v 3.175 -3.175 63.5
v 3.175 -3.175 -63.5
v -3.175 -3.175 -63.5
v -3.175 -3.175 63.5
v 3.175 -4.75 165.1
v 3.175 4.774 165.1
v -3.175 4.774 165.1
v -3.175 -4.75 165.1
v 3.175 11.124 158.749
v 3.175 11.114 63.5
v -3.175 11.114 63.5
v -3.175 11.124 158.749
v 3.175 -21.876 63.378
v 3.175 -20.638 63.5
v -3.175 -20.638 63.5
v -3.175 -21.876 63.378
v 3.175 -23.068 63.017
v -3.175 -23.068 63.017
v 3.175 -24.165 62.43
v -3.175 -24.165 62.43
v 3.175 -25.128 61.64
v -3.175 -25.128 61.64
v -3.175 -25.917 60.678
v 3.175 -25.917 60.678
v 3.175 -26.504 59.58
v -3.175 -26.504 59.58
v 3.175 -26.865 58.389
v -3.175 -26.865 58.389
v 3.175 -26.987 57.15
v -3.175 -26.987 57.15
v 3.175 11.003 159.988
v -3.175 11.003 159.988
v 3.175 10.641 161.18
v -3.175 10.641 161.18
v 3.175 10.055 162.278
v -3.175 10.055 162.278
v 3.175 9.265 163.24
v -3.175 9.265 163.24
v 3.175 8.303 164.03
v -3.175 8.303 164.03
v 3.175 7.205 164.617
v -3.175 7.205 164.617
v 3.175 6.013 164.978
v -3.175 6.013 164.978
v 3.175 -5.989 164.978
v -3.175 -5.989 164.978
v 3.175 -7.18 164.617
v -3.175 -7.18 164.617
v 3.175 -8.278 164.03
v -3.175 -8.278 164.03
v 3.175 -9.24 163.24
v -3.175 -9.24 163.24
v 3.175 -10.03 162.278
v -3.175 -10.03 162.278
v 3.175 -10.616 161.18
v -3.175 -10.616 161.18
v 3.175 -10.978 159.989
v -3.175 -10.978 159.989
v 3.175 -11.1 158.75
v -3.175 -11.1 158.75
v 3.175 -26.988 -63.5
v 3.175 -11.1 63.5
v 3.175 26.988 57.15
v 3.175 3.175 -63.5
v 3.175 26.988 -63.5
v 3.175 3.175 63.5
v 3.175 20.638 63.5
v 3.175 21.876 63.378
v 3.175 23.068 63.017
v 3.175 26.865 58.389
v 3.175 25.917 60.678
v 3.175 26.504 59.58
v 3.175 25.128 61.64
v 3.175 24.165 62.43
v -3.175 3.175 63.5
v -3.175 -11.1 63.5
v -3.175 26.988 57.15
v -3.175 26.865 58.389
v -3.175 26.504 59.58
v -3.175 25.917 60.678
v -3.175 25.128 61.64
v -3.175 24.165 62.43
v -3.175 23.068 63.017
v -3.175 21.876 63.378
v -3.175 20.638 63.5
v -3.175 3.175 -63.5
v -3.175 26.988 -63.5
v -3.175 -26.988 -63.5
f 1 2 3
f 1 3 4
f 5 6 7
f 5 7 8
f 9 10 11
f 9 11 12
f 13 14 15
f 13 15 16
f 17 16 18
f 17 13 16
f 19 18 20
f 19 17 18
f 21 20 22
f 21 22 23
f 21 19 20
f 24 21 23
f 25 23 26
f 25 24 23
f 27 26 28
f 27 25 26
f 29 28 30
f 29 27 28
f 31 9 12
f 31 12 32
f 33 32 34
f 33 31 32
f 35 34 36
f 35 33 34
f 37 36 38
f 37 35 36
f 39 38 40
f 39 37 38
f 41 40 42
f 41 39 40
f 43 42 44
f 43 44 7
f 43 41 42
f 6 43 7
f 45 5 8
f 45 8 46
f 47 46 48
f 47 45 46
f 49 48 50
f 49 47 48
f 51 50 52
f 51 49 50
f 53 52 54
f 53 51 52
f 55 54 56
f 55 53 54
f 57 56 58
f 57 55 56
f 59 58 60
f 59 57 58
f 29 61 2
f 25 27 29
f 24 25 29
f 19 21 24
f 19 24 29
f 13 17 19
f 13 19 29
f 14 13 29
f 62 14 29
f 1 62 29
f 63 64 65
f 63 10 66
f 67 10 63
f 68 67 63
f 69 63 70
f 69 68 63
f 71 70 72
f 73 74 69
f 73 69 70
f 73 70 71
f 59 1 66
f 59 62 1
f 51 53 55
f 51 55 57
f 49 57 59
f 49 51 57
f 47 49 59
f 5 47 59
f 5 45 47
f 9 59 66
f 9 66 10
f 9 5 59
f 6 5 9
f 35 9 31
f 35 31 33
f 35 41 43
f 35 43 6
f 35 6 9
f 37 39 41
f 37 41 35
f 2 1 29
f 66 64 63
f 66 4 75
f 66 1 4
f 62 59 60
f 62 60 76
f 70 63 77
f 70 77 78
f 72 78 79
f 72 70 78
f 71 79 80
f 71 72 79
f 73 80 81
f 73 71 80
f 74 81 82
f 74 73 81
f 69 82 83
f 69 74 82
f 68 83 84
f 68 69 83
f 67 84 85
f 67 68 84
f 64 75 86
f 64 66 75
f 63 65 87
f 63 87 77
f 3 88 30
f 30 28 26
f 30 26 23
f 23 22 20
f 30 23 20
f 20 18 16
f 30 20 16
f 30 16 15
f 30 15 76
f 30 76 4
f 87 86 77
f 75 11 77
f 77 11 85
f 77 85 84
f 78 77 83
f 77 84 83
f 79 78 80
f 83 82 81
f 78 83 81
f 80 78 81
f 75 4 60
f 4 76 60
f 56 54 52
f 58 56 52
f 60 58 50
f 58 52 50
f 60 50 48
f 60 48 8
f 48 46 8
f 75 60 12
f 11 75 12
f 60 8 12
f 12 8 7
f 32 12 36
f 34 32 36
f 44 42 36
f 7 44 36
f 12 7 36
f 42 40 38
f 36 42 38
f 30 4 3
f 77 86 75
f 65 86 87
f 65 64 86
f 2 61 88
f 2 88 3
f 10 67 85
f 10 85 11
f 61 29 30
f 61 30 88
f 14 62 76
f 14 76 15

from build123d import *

# Parameters (mm, degrees)
F1_DEPTH = 3.175


with BuildPart() as f1:
    # F0 (on Right) → F1 (new body, symmetric)
    with BuildSketch(Plane.YZ):
        with BuildLine():
            Line((3.175, -63.5), (26.9875, -63.5))
            Line((26.9875, -63.5), (26.9875, 57.15))
            ThreePointArc((26.9875, 57.15), (25.127628, 61.640128), (20.6375, 63.5))
            Line((20.6375, 63.5), (17.464617, 63.5))
            Line((17.464617, 63.5), (11.113911, 63.5))
            Line((11.113911, 63.5), (11.124494, 158.749293))
            ThreePointArc((11.124494, 158.749293), (9.264872, 163.239877), (4.774494, 165.099999))
            Line((4.774494, 165.099999), (-4.7498, 165.099999))
            ThreePointArc((-4.7498, 165.099999), (-9.239928, 163.240127), (-11.0998, 158.749999))
            Line((-11.0998, 158.749999), (-11.0998, 63.5))
            Line((-11.0998, 63.5), (-17.4498, 63.5))
            Line((-17.4498, 63.5), (-20.6375, 63.5))
            ThreePointArc((-20.6375, 63.5), (-25.127628, 61.640128), (-26.9875, 57.15))
            Line((-26.9875, 57.15), (-26.9875, -63.5))
            Line((-26.9875, -63.5), (-3.175, -63.5))
            Line((-3.175, -63.5), (-3.175, 63.5))
            Line((-3.175, 63.5), (3.175, 63.5))
            Line((3.175, 63.5), (3.175, -63.5))
        make_face()
    extrude(amount=F1_DEPTH, both=True)


solid = f1.part
